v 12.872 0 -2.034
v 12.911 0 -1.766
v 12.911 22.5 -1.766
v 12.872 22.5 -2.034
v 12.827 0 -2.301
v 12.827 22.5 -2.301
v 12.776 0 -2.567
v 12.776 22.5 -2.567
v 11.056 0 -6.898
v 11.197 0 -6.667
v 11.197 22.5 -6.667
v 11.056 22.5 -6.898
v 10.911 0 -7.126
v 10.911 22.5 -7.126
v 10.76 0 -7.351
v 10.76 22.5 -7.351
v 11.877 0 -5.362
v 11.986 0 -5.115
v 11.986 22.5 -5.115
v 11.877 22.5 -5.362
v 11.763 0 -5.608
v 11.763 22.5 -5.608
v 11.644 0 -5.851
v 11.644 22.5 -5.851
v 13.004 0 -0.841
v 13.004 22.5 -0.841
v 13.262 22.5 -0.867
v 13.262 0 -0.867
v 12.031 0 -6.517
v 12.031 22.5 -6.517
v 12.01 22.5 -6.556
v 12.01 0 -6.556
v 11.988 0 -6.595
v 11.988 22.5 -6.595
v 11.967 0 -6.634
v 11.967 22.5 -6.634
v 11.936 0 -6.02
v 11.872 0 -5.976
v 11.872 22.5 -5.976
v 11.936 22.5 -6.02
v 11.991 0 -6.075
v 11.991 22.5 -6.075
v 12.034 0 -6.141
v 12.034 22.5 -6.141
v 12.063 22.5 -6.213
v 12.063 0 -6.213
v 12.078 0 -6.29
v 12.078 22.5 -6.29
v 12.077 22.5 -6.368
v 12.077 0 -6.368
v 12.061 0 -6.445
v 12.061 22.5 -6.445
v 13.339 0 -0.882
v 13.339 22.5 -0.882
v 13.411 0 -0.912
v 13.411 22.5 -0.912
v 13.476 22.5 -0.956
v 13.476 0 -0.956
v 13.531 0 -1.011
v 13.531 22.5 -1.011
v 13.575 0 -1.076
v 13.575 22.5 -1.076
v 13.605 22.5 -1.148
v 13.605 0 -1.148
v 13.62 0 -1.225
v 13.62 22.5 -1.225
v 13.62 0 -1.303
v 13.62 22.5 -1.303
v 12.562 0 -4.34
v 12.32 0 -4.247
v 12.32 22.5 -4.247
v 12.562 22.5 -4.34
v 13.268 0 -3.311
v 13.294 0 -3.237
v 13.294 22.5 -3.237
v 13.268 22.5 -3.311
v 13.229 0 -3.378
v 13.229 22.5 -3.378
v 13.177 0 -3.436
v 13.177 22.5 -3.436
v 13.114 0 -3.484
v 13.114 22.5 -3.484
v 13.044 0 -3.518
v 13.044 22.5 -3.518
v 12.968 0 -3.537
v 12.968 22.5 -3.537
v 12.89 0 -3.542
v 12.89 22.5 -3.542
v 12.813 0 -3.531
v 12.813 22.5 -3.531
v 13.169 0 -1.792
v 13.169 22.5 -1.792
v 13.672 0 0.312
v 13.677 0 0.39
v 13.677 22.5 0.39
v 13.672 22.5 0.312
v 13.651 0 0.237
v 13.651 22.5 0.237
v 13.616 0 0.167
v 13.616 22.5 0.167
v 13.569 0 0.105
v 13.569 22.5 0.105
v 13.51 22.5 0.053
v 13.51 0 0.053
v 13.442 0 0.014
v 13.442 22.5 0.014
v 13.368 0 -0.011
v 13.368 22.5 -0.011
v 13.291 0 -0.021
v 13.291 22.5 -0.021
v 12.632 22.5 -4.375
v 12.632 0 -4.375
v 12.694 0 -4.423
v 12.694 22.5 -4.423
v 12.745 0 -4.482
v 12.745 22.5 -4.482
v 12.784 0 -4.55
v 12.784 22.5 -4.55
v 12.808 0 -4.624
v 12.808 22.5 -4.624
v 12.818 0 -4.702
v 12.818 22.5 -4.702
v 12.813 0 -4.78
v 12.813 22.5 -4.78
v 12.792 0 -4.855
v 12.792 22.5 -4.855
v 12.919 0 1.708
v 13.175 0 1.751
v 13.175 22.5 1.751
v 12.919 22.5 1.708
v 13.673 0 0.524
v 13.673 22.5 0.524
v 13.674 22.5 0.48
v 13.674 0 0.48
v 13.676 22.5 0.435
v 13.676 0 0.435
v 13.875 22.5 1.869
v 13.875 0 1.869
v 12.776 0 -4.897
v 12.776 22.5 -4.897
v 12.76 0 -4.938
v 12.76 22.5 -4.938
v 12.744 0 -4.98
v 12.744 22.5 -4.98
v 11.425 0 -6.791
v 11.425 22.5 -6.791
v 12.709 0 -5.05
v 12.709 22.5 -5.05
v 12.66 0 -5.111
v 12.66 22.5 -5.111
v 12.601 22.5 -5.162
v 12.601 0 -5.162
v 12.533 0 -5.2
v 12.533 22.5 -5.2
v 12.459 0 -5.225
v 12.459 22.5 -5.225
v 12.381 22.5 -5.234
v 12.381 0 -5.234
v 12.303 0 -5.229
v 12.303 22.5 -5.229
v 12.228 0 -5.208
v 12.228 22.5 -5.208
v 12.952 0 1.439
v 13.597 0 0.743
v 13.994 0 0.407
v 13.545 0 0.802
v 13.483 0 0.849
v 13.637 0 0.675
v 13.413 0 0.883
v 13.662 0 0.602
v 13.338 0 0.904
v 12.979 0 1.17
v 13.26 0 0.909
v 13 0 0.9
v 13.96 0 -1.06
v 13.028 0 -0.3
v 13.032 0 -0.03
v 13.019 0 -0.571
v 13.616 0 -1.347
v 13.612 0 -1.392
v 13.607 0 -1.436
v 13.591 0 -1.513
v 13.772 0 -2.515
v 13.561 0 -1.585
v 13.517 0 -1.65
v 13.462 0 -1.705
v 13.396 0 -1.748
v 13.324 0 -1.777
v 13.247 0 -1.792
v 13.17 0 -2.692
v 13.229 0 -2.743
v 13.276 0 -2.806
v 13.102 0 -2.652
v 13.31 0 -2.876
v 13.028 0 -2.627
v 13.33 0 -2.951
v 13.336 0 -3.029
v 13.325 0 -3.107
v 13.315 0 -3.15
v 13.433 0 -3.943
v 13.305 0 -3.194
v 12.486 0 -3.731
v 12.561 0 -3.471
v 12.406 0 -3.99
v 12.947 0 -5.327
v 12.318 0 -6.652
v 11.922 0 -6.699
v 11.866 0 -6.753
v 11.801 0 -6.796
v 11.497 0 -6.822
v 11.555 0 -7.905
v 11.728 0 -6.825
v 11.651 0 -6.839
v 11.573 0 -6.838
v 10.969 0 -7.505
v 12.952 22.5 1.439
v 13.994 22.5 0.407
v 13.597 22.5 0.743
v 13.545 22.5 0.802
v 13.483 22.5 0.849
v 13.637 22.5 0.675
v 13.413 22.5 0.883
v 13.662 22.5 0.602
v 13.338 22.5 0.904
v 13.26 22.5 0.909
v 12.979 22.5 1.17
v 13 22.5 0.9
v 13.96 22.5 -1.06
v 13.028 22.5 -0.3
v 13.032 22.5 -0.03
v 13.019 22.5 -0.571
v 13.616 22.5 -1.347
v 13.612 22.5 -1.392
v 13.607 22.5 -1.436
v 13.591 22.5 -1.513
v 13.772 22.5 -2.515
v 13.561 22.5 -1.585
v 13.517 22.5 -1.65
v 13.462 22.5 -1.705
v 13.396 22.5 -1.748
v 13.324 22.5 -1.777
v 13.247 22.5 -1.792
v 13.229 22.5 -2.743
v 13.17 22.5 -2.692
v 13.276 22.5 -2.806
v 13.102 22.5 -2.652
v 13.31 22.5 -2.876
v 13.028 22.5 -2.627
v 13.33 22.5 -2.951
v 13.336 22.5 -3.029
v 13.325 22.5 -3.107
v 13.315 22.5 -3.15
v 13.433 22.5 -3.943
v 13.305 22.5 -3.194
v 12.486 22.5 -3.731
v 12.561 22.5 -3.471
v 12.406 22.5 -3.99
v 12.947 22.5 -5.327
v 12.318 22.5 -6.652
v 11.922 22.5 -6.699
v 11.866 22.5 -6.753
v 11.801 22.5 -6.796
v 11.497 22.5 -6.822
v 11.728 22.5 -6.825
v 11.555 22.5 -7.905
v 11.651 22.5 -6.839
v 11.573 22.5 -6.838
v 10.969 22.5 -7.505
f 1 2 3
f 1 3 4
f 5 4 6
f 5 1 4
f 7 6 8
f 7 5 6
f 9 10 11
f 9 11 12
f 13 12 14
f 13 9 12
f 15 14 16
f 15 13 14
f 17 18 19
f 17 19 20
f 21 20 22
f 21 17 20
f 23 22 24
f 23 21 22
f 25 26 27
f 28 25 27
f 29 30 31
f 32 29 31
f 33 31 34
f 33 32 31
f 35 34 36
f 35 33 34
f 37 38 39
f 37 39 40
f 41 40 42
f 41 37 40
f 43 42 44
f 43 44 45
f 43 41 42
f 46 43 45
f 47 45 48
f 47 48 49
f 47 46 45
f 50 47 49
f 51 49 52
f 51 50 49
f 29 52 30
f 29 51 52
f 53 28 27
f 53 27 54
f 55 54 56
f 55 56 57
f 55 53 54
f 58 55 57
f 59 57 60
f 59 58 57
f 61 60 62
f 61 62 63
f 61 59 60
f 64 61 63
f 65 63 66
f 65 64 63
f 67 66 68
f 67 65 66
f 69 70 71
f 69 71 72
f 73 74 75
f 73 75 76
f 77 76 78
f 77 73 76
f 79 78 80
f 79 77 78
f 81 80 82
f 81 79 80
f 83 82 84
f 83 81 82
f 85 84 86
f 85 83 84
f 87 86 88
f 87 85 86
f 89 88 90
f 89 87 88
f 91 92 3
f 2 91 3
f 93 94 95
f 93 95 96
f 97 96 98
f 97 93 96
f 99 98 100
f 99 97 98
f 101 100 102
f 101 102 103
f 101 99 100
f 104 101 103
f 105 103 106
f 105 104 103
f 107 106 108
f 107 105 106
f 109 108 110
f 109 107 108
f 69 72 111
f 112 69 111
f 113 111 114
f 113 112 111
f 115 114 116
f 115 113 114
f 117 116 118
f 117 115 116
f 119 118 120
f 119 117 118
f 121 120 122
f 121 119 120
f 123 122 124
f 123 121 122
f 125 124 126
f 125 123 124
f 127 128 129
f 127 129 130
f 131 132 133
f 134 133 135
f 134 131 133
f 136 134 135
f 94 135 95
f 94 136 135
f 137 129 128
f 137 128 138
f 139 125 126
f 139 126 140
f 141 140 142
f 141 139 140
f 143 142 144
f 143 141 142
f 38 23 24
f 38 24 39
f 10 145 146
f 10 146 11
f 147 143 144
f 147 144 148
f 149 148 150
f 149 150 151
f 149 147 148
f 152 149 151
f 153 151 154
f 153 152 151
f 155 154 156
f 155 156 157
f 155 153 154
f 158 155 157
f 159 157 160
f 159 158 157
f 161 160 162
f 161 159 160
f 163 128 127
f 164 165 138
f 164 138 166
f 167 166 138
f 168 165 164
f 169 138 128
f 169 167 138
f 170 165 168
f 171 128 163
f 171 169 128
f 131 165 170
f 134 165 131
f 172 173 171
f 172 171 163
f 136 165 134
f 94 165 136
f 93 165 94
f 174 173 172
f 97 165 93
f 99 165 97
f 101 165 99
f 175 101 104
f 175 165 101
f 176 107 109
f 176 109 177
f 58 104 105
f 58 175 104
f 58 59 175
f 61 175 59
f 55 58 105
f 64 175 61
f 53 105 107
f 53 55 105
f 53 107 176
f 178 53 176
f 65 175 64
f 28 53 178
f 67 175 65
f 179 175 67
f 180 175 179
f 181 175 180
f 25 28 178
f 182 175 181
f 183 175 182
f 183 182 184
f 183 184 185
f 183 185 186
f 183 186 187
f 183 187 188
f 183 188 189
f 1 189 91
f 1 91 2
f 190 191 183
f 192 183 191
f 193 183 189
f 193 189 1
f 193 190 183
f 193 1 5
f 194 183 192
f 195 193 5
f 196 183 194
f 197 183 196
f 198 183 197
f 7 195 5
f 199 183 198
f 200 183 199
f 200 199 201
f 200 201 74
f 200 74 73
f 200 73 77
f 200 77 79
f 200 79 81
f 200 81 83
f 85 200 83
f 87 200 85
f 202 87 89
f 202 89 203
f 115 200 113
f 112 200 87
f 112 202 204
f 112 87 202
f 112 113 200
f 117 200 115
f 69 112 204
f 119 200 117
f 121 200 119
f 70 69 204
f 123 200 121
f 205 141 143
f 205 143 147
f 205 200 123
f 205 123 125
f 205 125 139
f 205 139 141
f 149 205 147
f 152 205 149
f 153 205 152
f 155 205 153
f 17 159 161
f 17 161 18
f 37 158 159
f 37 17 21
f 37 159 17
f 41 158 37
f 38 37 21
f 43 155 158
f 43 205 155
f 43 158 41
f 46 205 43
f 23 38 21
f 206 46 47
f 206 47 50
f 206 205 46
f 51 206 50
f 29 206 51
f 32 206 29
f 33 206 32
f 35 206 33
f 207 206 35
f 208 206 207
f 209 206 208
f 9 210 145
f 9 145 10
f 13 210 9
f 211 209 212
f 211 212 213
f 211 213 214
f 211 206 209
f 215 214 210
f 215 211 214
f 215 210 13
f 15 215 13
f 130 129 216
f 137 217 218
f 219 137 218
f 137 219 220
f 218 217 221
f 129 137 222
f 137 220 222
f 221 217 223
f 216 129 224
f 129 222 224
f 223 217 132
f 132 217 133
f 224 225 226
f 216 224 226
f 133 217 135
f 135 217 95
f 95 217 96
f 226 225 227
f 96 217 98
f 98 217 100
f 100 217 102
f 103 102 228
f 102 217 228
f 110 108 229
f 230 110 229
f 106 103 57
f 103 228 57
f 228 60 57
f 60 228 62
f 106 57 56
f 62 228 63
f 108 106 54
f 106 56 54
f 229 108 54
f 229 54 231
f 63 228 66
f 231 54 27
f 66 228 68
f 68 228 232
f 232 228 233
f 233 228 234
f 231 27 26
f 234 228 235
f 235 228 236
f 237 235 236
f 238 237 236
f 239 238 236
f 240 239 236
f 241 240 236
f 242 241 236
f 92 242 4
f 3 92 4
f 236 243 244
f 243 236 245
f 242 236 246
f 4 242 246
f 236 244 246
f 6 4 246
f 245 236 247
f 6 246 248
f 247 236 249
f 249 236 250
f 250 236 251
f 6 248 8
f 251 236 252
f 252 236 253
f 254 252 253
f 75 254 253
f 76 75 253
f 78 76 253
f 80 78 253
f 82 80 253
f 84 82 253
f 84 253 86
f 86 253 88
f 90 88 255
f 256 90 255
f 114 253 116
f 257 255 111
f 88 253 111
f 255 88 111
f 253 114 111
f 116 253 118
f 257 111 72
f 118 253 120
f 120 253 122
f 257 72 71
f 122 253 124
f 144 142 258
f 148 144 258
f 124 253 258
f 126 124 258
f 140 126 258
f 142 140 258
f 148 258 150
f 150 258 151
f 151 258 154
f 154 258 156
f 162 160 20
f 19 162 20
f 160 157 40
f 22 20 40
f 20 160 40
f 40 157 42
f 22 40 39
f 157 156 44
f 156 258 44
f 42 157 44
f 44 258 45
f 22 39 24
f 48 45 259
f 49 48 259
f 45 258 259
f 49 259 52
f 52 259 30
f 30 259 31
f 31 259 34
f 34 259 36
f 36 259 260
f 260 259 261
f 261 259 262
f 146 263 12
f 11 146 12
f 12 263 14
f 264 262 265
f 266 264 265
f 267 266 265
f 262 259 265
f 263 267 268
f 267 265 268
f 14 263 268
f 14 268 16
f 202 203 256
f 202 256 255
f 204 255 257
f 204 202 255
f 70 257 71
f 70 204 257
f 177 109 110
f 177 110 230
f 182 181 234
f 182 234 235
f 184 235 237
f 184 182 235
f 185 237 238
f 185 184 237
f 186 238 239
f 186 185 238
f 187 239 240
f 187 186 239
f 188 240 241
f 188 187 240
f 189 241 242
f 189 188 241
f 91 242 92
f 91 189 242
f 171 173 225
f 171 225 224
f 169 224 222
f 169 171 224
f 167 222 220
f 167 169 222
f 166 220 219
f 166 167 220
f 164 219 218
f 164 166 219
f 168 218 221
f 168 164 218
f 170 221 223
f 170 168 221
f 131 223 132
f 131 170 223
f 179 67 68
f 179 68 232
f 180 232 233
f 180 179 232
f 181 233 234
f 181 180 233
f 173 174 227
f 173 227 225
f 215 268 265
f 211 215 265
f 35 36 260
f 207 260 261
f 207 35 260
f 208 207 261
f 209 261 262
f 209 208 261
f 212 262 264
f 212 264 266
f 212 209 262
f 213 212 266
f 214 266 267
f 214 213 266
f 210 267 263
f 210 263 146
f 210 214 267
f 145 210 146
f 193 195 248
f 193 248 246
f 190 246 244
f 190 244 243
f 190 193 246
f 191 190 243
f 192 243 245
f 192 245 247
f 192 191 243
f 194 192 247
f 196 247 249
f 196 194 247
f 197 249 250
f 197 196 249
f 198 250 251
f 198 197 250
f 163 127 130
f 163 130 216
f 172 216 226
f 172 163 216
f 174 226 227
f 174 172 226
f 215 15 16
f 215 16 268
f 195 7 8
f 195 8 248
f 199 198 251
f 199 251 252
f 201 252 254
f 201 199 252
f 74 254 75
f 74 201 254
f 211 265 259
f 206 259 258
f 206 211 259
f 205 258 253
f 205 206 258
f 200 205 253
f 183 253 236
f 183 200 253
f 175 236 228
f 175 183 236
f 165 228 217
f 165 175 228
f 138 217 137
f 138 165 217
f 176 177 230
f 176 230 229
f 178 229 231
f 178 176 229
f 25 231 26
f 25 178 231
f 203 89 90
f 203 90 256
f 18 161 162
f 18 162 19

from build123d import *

# Parameters (mm, degrees)
RESSALTO_EXTRUS_O1_DEPTH = 22.5
CORTE_EXTRUS_O1_DEPTH    = 28.741906497


with BuildPart() as part:
    # Esboço1 → Ressalto-extrusão1 (new body)
    with BuildSketch(Plane(origin=(0, 0, 0), x_dir=(1, 0, 0), z_dir=(0, 1, 0))):
        with BuildLine():
            Line((10.760467264, 7.350777988), (10.969182874, 7.504560719))
            ThreePointArc((10.969182874, 7.504560719), (11.122613734, 7.740848698), (11.082224189, 8.019670724))
            Line((11.082224189, 8.019670724), (11.341808671, 8.207519484))
            ThreePointArc((11.341808671, 8.207519484), (13.61934662, 3.242436992), (13.823462506, -2.216277139))
            Line((13.823462506, -2.216277139), (13.507778422, -2.165664391))
            ThreePointArc((13.507778422, -2.165664391), (13.420279696, -1.89483606), (13.174835153, -1.750749321))
            Line((13.174835153, -1.750749321), (12.919194973, -1.707628189))
            ThreePointArc((12.919194973, -1.707628189), (12.966114499, -1.304403152), (13.000451936, -0.899912346))
            Line((13.000451936, -0.899912346), (13.259558649, -0.908575229))
            ThreePointArc((13.259558649, -0.908575229), (13.545442602, -0.801602223), (13.67263107, -0.524120778))
            ThreePointArc((13.67263107, -0.524120778), (13.675032192, -0.457206207), (13.677105833, -0.390280687))
            ThreePointArc((13.677105833, -0.390280687), (13.568735109, -0.104923638), (13.290634577, 0.020905426))
            Line((13.290634577, 0.020905426), (13.031527865, 0.029568308))
            ThreePointArc((13.031527865, 0.029568308), (13.024284113, 0.435449325), (13.004401826, 0.840907789))
            Line((13.004401826, 0.840907789), (13.262351305, 0.866857746))
            ThreePointArc((13.262351305, 0.866857746), (13.53142635, 1.010980886), (13.62049532, 1.302939063))
            ThreePointArc((13.62049532, 1.302939063), (13.613956179, 1.369576627), (13.607091018, 1.436181392))
            ThreePointArc((13.607091018, 1.436181392), (13.461652861, 1.704547935), (13.169262312, 1.792187114))
            Line((13.169262312, 1.792187114), (12.911312833, 1.766237157))
            ThreePointArc((12.911312833, 1.766237157), (12.850035069, 2.167531198), (12.776287858, 2.566721906))
            Line((12.776287858, 2.566721906), (13.028476989, 2.626821624))
            ThreePointArc((13.028476989, 2.626821624), (13.275941474, 2.805523017), (13.325301509, 3.106747926))
            ThreePointArc((13.325301509, 3.106747926), (13.309938795, 3.171919333), (13.294257343, 3.23701478))
            ThreePointArc((13.294257343, 3.23701478), (13.114347099, 3.48360181), (12.812884249, 3.531487182))
            Line((12.812884249, 3.531487182), (12.560695118, 3.471387463))
            ThreePointArc((12.560695118, 3.471387463), (12.446476845, 3.860933427), (12.32018073, 4.246732809))
            Line((12.32018073, 4.246732809), (12.562109192, 4.339909808))
            ThreePointArc((12.562109192, 4.339909808), (12.783547108, 4.550000523), (12.792317376, 4.855116798))
            ThreePointArc((12.792317376, 4.855116798), (12.768405238, 4.917659063), (12.744187329, 4.980083563))
            ThreePointArc((12.744187329, 4.980083563), (12.533015503, 5.200490728), (12.227859963, 5.207767777))
            Line((12.227859963, 5.207767777), (11.985931502, 5.114590777))
            ThreePointArc((11.985931502, 5.114590777), (11.820810947, 5.485437206), (11.644219685, 5.850960664))
            Line((11.644219685, 5.850960664), (11.871570259, 5.975552199))
            ThreePointArc((11.871570259, 5.975552199), (12.06303004, 6.213283162), (12.031054037, 6.516845996))
            ThreePointArc((12.031054037, 6.516845996), (11.999019187, 6.575643051), (11.966696991, 6.634282636))
            ThreePointArc((11.966696991, 6.634282636), (11.728031948, 6.824576766), (11.424629227, 6.791115632))
            Line((11.424629227, 6.791115632), (11.197278653, 6.666524097))
            ThreePointArc((11.197278653, 6.666524097), (10.984202397, 7.012053229), (10.760467264, 7.350777988))
        make_face()
    extrude(amount=RESSALTO_EXTRUS_O1_DEPTH)

    # Esboço2 → Corte-extrusão1 (cut, through all)
    with BuildSketch(Plane(origin=(0, 22.5, 0), x_dir=(1, 0, 0), z_dir=(0, 1, 0))):
        with BuildLine():
            Line((13.174835153, -1.750749321), (13.874709853, -1.868803493))
            ThreePointArc((13.874709853, -1.868803493), (13.850175901, -2.042701034), (13.823462506, -2.216277139))
            Line((13.823462506, -2.216277139), (13.507778422, -2.165664391))
            ThreePointArc((13.507778422, -2.165664391), (13.420279696, -1.89483606), (13.174835153, -1.750749321))
        make_face()
        with BuildLine():
            Line((10.969182874, 7.504560719), (11.554630395, 7.905094334))
            ThreePointArc((11.554630395, 7.905094334), (11.449218127, 8.057009637), (11.341808671, 8.207519484))
            Line((11.341808671, 8.207519484), (11.082224189, 8.019670724))
            ThreePointArc((11.082224189, 8.019670724), (11.122613734, 7.740848698), (10.969182874, 7.504560719))
        make_face()
    extrude(amount=-CORTE_EXTRUS_O1_DEPTH, mode=Mode.SUBTRACT)


solid = part.part
